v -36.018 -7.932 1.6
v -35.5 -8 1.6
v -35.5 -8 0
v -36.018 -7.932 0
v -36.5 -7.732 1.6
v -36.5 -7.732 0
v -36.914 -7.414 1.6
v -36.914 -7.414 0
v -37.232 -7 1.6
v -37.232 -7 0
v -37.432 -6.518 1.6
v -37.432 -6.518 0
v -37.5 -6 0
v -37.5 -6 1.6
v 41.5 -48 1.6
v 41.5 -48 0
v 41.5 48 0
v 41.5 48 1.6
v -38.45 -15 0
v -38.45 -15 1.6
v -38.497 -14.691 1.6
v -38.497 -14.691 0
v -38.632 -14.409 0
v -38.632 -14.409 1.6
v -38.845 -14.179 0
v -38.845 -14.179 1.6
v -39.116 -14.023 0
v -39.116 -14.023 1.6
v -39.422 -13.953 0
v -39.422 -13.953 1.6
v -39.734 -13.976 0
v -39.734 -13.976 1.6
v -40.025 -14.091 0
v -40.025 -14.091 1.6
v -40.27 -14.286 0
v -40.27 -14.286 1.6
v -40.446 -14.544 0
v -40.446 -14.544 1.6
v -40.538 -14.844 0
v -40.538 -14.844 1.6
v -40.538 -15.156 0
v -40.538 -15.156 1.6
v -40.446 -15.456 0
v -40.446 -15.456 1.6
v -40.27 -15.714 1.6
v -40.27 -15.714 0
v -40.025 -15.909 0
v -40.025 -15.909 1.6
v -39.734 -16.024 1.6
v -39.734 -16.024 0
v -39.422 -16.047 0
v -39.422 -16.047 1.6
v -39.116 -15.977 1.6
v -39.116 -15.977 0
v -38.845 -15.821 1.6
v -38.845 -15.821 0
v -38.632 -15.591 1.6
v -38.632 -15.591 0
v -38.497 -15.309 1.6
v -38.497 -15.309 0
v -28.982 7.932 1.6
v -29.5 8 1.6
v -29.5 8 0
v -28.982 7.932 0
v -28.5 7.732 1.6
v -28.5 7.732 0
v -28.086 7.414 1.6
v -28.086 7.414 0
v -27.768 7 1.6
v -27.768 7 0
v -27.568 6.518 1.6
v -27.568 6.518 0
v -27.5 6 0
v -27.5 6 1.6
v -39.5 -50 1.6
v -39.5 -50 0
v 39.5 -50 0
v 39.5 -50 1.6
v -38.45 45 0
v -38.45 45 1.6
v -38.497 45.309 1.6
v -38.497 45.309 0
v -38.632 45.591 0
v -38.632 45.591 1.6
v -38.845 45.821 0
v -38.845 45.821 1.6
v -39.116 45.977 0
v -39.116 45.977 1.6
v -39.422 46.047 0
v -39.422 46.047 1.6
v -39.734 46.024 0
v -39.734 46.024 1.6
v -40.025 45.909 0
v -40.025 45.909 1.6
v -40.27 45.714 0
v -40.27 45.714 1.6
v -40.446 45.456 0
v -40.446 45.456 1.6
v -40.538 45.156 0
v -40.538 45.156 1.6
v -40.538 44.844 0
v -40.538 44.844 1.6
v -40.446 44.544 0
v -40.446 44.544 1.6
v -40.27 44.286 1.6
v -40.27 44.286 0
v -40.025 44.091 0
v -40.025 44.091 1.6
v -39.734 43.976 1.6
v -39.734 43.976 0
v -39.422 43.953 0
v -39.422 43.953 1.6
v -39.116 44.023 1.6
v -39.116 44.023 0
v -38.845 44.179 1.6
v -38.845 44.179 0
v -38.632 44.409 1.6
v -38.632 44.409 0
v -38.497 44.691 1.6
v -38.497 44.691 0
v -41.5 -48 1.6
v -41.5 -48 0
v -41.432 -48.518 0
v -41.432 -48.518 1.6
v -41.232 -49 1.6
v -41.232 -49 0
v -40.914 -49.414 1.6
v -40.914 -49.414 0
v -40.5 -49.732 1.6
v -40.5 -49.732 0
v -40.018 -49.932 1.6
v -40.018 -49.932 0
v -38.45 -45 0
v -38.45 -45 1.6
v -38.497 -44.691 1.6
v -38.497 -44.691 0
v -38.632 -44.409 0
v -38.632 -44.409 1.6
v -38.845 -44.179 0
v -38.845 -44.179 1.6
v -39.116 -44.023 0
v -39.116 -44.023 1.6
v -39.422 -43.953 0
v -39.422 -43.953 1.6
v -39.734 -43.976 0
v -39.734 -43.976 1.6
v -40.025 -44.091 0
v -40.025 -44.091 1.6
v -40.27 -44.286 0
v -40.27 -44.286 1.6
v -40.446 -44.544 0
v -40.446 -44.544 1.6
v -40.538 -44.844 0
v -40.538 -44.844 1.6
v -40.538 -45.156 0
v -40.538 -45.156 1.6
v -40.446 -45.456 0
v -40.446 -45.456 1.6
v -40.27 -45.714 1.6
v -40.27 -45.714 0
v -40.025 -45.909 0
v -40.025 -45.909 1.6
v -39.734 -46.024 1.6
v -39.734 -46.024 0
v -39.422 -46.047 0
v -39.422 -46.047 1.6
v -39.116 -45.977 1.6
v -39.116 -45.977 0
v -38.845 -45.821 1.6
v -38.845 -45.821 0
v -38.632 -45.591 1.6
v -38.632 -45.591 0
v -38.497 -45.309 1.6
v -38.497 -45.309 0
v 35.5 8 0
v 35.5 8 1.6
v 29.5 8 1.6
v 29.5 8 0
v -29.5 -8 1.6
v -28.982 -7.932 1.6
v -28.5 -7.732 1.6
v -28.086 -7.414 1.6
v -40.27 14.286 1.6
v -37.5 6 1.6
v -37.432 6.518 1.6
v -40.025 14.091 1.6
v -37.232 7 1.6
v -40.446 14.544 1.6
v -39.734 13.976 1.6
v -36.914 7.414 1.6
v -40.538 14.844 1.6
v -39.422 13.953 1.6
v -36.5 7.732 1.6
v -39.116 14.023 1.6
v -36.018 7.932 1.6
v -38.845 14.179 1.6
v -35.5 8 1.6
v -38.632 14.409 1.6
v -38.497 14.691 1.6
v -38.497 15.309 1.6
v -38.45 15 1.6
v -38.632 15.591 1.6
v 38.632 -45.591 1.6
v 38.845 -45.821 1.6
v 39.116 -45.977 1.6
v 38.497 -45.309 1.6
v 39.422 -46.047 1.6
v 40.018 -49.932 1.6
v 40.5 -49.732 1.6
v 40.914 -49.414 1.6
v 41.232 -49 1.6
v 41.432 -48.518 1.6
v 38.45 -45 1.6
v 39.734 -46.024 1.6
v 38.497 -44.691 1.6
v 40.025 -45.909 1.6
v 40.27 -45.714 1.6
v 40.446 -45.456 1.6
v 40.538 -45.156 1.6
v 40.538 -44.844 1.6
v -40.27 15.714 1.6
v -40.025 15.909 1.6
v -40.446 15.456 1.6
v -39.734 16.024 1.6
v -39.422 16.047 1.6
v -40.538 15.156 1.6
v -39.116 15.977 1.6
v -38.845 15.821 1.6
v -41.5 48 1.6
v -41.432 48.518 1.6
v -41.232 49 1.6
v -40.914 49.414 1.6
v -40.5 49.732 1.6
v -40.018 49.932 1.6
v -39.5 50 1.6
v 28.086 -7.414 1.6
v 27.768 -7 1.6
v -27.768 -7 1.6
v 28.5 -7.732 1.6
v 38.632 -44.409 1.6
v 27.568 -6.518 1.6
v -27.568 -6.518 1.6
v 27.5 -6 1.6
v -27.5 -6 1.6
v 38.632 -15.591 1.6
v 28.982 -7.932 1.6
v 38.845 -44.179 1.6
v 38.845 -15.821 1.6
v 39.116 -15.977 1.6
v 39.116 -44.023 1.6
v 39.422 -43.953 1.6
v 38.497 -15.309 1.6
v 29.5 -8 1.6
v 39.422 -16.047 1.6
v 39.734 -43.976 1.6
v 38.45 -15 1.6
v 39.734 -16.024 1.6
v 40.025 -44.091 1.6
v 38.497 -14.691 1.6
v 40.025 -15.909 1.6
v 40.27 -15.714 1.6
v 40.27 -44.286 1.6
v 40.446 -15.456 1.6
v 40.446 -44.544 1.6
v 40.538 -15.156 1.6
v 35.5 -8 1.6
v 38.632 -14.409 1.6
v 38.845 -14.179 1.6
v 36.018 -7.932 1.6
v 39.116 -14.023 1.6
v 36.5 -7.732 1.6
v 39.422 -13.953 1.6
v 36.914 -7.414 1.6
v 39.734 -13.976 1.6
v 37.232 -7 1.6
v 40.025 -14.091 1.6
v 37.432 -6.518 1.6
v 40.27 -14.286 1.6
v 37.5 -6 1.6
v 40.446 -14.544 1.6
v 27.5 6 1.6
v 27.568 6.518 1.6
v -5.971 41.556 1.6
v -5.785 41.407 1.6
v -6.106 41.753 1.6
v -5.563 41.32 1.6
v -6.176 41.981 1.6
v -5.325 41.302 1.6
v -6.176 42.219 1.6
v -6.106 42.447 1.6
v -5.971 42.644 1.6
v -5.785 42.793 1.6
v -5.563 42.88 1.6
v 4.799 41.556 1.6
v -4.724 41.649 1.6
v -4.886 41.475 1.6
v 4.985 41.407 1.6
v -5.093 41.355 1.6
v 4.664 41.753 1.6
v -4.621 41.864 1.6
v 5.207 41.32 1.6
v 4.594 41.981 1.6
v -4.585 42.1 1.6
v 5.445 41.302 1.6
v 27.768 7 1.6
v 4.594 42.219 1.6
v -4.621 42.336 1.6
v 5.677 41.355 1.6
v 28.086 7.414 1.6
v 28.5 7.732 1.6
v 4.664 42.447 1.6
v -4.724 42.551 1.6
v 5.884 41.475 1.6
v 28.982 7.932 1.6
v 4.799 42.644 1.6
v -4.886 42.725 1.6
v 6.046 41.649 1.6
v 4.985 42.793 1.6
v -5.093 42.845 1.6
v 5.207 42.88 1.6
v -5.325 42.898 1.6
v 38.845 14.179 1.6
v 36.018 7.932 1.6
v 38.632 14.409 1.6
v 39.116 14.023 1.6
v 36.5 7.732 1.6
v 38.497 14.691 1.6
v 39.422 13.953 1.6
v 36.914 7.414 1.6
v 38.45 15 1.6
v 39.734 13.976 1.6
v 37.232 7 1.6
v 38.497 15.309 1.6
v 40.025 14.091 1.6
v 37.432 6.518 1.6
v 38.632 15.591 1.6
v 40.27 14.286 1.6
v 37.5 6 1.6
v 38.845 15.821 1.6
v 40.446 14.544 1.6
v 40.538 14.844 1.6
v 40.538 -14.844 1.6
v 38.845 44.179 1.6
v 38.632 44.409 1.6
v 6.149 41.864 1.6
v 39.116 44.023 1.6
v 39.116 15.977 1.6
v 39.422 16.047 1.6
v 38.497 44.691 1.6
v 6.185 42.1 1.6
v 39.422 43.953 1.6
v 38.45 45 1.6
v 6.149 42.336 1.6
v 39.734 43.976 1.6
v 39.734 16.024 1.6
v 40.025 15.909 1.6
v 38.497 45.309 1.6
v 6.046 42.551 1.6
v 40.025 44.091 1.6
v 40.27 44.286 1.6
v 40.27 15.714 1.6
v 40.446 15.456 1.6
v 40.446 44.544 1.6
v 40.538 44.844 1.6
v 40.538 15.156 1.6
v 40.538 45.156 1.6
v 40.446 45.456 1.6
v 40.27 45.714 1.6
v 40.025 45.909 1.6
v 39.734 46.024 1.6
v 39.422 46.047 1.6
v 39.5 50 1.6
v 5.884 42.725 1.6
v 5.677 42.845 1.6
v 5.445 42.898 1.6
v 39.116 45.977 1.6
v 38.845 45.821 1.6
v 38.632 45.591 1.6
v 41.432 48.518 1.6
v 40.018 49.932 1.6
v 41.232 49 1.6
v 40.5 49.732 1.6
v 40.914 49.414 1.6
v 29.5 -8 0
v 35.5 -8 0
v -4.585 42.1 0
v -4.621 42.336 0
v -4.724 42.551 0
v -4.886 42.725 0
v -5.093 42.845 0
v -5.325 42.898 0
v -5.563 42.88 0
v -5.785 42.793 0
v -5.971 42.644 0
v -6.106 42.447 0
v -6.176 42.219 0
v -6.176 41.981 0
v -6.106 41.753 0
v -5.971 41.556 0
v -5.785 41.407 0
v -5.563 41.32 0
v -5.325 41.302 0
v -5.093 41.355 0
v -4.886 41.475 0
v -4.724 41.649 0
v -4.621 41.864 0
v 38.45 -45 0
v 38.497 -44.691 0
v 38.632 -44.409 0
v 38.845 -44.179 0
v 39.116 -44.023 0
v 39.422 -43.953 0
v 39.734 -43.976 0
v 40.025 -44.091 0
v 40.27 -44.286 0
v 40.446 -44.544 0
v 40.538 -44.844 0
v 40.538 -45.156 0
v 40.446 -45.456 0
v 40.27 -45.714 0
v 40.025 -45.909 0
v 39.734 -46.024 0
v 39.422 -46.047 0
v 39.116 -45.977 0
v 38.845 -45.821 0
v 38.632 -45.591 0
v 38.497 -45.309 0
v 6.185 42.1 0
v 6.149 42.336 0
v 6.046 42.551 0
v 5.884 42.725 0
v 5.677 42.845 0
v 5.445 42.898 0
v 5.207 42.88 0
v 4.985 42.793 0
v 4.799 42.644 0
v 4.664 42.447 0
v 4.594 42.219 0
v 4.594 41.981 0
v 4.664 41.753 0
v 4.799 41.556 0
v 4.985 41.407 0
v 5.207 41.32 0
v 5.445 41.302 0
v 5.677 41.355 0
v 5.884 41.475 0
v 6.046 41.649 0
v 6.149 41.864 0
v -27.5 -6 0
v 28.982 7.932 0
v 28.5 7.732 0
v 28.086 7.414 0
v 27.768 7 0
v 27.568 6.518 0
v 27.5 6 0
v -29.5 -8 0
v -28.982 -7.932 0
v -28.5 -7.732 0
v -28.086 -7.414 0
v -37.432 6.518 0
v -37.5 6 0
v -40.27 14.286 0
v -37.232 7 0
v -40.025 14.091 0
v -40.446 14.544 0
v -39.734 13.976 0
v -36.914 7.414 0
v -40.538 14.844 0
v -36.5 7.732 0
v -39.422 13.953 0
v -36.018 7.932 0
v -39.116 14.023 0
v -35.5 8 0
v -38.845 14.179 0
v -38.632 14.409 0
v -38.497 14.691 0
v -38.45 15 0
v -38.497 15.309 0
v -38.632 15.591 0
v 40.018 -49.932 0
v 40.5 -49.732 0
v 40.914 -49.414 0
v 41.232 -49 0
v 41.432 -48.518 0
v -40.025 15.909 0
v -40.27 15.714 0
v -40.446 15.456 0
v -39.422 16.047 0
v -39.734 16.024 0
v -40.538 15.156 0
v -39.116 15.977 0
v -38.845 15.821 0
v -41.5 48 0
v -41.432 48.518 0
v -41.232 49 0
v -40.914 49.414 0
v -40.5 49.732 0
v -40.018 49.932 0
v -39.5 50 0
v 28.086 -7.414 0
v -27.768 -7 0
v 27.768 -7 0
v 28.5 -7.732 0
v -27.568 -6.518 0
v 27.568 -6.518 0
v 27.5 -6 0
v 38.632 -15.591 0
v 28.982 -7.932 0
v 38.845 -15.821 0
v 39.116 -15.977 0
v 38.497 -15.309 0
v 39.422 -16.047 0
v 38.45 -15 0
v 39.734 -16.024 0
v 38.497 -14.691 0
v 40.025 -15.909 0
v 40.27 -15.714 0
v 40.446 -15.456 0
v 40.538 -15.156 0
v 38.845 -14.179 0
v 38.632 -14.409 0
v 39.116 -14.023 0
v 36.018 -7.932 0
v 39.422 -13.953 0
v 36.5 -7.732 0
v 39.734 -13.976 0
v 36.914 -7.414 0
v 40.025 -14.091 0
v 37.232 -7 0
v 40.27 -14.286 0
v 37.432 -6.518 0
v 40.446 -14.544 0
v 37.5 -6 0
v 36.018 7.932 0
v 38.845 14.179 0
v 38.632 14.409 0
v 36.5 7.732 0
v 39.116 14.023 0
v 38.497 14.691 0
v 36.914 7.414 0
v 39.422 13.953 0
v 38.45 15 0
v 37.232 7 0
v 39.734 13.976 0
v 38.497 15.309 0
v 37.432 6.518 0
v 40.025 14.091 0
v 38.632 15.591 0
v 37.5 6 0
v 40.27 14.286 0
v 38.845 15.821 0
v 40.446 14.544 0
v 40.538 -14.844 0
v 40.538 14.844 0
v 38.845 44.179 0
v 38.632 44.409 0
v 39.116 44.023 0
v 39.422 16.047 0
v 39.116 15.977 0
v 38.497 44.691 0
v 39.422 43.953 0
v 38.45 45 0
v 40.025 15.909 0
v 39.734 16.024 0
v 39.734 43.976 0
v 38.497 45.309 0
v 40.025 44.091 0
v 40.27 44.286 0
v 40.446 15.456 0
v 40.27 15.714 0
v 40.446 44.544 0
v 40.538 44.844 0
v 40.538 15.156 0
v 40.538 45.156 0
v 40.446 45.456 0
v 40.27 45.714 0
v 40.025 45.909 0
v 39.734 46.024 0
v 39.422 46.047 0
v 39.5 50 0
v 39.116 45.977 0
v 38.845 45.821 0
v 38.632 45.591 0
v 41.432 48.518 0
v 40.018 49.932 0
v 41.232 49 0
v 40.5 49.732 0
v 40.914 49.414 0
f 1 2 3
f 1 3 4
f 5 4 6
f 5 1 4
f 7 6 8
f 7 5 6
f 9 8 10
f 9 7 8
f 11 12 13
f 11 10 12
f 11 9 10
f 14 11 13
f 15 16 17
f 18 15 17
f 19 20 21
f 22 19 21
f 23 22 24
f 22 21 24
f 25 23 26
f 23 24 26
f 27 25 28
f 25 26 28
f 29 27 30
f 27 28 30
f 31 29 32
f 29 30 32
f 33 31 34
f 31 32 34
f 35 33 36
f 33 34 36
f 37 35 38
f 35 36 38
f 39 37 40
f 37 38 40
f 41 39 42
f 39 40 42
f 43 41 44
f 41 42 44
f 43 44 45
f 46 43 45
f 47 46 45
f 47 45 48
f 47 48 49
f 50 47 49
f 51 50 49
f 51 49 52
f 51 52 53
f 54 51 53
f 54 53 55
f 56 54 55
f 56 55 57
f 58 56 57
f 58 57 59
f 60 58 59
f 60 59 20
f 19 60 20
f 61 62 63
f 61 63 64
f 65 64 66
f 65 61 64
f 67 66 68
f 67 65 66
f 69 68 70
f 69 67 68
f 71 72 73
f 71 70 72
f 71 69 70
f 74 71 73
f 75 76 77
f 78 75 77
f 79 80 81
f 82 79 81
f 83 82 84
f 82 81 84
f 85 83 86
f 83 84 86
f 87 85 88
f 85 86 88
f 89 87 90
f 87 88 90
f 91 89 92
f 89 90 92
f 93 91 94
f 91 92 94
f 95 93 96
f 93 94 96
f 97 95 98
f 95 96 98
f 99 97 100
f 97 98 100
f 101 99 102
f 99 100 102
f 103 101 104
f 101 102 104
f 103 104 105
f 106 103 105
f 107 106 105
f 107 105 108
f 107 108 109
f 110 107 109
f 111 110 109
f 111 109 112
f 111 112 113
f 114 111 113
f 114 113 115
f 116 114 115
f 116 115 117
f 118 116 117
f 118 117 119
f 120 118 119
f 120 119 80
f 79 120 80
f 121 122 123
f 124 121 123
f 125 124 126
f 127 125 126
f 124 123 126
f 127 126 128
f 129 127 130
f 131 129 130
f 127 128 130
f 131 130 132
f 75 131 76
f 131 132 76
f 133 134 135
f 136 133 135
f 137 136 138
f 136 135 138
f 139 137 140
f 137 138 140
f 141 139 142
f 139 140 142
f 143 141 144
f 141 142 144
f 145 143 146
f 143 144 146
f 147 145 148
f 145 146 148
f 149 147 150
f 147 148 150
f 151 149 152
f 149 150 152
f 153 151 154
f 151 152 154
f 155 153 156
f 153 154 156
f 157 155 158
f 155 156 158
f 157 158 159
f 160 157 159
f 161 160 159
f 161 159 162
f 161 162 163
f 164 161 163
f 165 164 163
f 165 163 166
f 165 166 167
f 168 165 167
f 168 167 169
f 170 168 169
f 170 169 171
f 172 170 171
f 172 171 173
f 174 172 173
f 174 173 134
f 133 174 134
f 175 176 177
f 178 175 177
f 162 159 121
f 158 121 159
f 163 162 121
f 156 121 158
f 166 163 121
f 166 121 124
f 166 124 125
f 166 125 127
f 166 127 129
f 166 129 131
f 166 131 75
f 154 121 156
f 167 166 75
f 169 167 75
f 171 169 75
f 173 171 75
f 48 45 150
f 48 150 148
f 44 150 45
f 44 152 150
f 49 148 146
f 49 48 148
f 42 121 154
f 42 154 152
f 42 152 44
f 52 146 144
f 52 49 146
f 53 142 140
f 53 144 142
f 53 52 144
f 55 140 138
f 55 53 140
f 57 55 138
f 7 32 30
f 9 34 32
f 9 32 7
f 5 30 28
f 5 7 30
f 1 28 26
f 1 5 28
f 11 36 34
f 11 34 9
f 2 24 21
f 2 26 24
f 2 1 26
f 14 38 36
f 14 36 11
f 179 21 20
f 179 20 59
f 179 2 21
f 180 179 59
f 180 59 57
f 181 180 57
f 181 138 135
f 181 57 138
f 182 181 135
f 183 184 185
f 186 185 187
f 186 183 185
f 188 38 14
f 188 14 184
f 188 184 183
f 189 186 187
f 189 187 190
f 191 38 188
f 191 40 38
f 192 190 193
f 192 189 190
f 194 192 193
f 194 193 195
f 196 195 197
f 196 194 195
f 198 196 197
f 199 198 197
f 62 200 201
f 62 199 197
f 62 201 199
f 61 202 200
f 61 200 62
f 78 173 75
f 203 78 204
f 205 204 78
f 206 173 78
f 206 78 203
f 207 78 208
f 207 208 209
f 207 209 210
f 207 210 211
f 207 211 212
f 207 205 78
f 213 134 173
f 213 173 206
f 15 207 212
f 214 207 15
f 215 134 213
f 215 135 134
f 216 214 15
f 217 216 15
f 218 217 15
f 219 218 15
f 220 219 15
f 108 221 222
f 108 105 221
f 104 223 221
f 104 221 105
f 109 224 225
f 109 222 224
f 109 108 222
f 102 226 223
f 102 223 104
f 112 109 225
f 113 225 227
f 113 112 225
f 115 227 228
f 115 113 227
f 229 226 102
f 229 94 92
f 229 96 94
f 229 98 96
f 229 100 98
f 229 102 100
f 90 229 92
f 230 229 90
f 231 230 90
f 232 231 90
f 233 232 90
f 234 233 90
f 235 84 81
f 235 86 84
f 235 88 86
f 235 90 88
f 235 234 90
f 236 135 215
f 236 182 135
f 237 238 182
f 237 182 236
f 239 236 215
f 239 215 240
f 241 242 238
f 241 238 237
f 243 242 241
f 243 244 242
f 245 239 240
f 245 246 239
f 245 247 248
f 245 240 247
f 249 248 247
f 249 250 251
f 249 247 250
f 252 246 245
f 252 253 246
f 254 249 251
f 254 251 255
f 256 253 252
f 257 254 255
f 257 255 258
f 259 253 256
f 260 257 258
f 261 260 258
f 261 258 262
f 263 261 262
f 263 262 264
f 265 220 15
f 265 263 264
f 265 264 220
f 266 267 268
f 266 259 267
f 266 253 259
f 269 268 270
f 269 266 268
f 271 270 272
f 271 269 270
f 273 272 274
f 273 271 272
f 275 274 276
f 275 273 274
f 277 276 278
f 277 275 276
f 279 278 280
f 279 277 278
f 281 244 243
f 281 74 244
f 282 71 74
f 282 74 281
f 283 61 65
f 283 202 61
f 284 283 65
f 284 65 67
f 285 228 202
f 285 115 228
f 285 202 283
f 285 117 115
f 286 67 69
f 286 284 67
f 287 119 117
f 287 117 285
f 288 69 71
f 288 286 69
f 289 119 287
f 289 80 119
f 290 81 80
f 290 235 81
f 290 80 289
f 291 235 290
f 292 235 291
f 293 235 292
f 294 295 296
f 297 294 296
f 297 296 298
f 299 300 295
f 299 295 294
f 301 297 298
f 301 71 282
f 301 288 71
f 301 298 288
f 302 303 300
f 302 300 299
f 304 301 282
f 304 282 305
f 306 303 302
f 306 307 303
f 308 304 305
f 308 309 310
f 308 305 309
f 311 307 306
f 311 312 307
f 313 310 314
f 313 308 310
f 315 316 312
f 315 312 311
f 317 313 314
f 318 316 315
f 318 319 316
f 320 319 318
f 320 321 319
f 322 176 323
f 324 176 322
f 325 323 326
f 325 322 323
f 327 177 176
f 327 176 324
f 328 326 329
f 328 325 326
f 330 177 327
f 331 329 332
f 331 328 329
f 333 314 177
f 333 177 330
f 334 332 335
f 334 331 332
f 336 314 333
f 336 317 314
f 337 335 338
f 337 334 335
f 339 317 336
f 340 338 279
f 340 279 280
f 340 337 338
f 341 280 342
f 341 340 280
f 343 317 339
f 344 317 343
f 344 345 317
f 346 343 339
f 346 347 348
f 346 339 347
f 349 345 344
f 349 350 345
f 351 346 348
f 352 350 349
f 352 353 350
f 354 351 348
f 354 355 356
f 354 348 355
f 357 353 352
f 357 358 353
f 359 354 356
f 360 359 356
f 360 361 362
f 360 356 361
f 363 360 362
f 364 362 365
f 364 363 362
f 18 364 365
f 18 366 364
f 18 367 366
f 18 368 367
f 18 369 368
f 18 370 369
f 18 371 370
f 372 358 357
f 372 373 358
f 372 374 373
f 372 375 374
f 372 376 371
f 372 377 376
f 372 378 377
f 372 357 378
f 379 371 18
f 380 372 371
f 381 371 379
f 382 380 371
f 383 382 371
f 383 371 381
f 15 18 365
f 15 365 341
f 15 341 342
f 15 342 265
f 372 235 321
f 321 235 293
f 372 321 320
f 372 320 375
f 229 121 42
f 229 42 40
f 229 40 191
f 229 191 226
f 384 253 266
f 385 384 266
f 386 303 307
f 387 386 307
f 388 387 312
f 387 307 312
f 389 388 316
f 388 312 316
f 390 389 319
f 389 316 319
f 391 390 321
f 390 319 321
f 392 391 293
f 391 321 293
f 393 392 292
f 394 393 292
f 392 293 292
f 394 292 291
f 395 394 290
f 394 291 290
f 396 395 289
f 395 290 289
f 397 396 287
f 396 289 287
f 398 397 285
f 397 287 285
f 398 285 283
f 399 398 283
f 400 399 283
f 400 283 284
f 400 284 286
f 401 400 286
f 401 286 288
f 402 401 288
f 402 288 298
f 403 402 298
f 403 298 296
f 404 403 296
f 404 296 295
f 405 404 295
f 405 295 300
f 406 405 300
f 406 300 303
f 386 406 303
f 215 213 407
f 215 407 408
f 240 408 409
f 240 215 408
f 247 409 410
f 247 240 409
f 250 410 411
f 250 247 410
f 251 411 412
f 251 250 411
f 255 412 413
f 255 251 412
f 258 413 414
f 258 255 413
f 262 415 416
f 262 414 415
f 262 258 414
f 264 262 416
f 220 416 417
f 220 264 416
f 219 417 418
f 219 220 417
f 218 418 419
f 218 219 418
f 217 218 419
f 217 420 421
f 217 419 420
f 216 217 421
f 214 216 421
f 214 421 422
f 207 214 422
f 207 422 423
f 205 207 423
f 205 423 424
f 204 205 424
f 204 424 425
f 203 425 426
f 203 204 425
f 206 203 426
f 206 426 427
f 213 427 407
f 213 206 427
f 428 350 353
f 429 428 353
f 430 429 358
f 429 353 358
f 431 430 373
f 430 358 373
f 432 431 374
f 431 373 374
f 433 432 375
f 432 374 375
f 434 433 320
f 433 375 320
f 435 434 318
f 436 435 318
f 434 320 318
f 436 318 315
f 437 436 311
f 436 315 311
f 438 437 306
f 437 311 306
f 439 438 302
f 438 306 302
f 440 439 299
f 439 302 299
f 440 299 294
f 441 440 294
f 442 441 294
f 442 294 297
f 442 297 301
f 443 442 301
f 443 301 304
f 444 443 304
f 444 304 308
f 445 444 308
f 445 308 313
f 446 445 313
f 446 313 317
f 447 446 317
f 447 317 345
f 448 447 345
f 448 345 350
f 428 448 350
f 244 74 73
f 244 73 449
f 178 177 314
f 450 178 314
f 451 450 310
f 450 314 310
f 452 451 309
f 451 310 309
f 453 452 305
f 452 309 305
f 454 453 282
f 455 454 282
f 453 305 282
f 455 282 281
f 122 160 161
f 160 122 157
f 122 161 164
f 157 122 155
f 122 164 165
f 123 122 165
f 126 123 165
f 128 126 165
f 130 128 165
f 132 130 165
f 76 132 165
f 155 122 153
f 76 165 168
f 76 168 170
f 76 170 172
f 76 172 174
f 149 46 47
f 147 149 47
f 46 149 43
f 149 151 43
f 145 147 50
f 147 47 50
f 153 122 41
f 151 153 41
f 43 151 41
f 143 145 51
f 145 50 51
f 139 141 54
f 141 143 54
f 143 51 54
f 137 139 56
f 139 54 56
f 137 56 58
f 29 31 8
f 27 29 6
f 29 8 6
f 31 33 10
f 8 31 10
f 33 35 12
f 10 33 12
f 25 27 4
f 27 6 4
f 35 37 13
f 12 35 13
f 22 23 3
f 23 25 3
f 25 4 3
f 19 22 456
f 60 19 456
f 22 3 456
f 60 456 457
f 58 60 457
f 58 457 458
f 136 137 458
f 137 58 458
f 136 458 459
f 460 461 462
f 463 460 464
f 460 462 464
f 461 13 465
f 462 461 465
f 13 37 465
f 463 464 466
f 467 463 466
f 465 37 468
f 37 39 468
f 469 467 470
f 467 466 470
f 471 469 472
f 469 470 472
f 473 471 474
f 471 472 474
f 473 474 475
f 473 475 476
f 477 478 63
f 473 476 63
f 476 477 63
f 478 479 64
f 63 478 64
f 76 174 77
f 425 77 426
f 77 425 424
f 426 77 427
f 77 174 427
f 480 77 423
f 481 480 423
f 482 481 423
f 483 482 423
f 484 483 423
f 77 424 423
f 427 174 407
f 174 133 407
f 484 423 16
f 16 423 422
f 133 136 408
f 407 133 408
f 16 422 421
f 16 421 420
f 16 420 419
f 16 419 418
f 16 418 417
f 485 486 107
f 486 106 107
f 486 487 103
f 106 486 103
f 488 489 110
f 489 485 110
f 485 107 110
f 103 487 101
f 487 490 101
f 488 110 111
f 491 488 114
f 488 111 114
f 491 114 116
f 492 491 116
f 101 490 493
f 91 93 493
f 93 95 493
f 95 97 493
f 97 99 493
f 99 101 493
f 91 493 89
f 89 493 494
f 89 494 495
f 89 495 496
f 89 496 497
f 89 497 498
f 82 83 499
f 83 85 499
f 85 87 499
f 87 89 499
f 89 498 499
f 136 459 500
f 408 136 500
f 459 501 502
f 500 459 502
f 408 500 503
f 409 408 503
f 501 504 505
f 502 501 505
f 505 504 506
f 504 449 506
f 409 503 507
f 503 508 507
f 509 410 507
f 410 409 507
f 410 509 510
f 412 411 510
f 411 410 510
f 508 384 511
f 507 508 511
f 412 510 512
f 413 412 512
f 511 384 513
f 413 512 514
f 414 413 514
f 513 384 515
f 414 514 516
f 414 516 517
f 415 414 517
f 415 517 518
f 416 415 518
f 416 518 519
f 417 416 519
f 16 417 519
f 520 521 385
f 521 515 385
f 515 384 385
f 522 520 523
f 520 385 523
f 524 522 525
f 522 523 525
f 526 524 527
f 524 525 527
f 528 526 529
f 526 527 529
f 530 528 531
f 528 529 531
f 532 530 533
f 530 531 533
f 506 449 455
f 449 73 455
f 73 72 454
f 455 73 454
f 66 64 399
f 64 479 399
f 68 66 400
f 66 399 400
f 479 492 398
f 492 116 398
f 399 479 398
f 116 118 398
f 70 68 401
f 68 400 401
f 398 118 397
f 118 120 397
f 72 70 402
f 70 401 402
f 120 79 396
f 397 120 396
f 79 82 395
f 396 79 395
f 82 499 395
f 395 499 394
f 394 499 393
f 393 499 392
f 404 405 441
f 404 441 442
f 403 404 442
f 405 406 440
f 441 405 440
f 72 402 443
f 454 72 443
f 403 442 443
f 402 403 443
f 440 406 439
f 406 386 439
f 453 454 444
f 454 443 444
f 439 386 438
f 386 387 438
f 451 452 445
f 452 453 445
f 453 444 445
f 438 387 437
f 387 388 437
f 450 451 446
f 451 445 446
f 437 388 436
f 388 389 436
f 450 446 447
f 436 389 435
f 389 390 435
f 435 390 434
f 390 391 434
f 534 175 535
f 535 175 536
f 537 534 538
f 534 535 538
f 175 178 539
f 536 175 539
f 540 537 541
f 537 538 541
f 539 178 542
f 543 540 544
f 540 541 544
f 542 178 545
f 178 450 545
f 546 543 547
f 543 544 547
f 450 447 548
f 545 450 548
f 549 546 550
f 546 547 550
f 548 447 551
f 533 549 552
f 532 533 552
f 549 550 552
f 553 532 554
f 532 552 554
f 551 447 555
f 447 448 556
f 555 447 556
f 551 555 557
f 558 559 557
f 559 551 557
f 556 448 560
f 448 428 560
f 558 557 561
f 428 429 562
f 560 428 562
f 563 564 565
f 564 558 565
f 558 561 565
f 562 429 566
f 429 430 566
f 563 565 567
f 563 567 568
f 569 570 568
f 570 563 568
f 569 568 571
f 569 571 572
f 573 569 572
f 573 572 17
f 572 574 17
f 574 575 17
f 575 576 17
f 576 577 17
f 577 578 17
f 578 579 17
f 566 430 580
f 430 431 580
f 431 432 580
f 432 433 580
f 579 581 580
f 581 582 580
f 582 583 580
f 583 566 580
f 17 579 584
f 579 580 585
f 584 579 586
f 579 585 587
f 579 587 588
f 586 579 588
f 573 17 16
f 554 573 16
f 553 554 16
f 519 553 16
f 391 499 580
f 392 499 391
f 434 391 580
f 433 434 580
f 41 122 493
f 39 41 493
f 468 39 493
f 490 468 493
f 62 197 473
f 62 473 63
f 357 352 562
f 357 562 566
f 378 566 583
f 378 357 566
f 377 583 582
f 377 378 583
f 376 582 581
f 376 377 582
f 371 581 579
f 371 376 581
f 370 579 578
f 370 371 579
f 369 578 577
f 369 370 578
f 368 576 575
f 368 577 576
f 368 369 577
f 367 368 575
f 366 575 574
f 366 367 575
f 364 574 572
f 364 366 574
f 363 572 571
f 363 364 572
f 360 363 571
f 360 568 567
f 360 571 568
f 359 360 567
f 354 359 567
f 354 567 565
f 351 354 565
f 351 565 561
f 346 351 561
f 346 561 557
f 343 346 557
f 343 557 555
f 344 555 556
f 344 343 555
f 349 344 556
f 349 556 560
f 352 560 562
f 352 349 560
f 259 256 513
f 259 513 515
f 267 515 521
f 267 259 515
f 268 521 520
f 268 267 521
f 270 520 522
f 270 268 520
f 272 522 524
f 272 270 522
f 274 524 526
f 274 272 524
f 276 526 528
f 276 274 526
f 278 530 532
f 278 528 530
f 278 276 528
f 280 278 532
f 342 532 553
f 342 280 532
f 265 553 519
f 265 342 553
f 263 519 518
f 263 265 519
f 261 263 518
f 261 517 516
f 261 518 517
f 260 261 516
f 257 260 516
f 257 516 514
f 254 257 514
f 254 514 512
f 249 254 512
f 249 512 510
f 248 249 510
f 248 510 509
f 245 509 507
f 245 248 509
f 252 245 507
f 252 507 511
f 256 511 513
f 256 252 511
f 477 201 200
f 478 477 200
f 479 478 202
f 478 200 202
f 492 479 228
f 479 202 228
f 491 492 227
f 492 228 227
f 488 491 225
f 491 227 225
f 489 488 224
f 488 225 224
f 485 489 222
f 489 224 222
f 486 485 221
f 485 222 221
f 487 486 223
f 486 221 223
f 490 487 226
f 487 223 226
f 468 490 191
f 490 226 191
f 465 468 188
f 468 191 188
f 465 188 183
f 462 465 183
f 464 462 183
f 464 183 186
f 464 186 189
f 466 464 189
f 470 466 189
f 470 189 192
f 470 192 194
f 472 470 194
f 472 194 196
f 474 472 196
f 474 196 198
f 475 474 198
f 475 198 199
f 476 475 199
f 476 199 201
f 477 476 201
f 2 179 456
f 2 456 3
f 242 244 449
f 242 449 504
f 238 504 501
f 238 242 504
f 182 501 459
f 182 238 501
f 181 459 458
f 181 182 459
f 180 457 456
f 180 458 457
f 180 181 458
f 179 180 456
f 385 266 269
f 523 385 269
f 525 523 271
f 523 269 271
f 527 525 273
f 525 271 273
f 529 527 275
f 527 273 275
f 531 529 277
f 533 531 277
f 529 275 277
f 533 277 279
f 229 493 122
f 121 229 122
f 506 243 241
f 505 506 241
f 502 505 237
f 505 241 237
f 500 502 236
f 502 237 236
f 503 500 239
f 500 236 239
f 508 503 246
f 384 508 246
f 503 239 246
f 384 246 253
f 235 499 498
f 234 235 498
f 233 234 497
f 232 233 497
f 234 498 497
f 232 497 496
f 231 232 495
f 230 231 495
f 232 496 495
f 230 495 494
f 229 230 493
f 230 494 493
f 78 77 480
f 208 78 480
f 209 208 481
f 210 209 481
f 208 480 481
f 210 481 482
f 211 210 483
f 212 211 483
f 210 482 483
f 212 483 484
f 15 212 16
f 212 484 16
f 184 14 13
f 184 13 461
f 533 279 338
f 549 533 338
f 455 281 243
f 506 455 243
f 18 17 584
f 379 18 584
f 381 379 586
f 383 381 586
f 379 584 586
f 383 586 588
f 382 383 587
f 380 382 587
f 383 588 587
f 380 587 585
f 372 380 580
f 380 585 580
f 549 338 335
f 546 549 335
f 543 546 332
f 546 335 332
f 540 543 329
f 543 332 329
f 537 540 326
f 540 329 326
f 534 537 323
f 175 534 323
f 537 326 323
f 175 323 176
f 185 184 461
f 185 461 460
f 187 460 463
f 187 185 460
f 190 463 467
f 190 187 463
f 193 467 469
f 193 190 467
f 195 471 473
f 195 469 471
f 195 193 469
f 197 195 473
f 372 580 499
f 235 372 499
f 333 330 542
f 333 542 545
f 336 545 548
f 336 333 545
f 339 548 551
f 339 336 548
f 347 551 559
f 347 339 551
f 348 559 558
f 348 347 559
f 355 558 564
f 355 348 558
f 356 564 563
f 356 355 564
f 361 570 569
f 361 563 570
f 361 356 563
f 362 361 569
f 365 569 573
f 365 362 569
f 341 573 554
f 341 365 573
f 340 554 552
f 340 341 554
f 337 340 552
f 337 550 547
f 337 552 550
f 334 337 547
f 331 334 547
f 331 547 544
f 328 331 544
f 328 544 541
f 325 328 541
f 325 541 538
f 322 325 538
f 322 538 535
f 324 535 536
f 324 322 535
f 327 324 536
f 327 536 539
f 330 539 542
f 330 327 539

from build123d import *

# Parameters (mm, degrees)
BOARDOUTLINE_DEPTH   = 1.6
SKETCH2_R            = 0.8
COMPONENTHOLES_DEPTH = 65.998538445
WINDOWS_1SIDE_DEPTH  = 65.998538445
M2_CLEARANCE_HOLE1_D = 2.1


with BuildPart() as part:
    # Sketch1 → boardOutline (new body)
    with BuildSketch(Plane.XY):
        with BuildLine():
            Line((-39.5, -50), (39.5, -50))
            ThreePointArc((39.5, -50), (40.914213562, -49.414213562), (41.5, -48))
            Line((41.5, -48), (41.5, 48))
            ThreePointArc((41.5, 48), (40.914213562, 49.414213562), (39.5, 50))
            Line((39.5, 50), (-39.5, 50))
            ThreePointArc((-39.5, 50), (-40.914213562, 49.414213562), (-41.5, 48))
            Line((-41.5, 48), (-41.5, -48))
            ThreePointArc((-41.5, -48), (-40.914213562, -49.414213562), (-39.5, -50))
        make_face()
    extrude(amount=BOARDOUTLINE_DEPTH)

    # Sketch2 → componentHoles (cut, through all)
    with BuildSketch(Plane.XY.offset(1.6)):
        with Locations((-5.385, 42.1)):
            Circle(SKETCH2_R)
        with Locations((5.385, 42.1)):
            Circle(SKETCH2_R)
    extrude(amount=-COMPONENTHOLES_DEPTH, mode=Mode.SUBTRACT)

    # Sketch3 → windows_1side (cut, through all)
    with BuildSketch(Plane.XY.offset(1.6)):
        with BuildLine():
            Line((37.5, -6), (37.5, 6))
            ThreePointArc((37.5, 6), (36.914213562, 7.414213562), (35.5, 8))
            Line((35.5, 8), (29.5, 8))
            ThreePointArc((29.5, 8), (28.085786438, 7.414213562), (27.5, 6))
            Line((27.5, 6), (27.5, -6))
            ThreePointArc((27.5, -6), (28.085786438, -7.414213562), (29.5, -8))
            Line((29.5, -8), (35.5, -8))
            ThreePointArc((35.5, -8), (36.914213562, -7.414213562), (37.5, -6))
        make_face()
        with BuildLine():
            Line((-29.5, -8), (-35.5, -8))
            ThreePointArc((-35.5, -8), (-36.914213562, -7.414213562), (-37.5, -6))
            Line((-37.5, -6), (-37.5, 6))
            ThreePointArc((-37.5, 6), (-36.914213562, 7.414213562), (-35.5, 8))
            Line((-35.5, 8), (-29.5, 8))
            ThreePointArc((-29.5, 8), (-28.085786438, 7.414213562), (-27.5, 6))
            Line((-27.5, 6), (-27.5, -6))
            ThreePointArc((-27.5, -6), (-28.085786438, -7.414213562), (-29.5, -8))
        make_face()
    extrude(amount=-WINDOWS_1SIDE_DEPTH, mode=Mode.SUBTRACT)

    # M2 Clearance Hole1 (through all)
    with Locations(Plane(origin=(0, 0, 0), x_dir=(-1, 0, 0), z_dir=(0, 0, -1))):
        with Locations((39.5, 45), (39.5, -15), (39.5, -45), (39.5, 15)):
            m2_clearance_hole1 = Hole(M2_CLEARANCE_HOLE1_D / 2)

    # Mirror1: M2 Clearance Hole1 across plane
    add(m2_clearance_hole1.mirror(Plane(origin=(0, 0, 0), x_dir=(0, 0, 1), z_dir=(1, 0, 0))), mode=Mode.SUBTRACT)


solid = part.part
